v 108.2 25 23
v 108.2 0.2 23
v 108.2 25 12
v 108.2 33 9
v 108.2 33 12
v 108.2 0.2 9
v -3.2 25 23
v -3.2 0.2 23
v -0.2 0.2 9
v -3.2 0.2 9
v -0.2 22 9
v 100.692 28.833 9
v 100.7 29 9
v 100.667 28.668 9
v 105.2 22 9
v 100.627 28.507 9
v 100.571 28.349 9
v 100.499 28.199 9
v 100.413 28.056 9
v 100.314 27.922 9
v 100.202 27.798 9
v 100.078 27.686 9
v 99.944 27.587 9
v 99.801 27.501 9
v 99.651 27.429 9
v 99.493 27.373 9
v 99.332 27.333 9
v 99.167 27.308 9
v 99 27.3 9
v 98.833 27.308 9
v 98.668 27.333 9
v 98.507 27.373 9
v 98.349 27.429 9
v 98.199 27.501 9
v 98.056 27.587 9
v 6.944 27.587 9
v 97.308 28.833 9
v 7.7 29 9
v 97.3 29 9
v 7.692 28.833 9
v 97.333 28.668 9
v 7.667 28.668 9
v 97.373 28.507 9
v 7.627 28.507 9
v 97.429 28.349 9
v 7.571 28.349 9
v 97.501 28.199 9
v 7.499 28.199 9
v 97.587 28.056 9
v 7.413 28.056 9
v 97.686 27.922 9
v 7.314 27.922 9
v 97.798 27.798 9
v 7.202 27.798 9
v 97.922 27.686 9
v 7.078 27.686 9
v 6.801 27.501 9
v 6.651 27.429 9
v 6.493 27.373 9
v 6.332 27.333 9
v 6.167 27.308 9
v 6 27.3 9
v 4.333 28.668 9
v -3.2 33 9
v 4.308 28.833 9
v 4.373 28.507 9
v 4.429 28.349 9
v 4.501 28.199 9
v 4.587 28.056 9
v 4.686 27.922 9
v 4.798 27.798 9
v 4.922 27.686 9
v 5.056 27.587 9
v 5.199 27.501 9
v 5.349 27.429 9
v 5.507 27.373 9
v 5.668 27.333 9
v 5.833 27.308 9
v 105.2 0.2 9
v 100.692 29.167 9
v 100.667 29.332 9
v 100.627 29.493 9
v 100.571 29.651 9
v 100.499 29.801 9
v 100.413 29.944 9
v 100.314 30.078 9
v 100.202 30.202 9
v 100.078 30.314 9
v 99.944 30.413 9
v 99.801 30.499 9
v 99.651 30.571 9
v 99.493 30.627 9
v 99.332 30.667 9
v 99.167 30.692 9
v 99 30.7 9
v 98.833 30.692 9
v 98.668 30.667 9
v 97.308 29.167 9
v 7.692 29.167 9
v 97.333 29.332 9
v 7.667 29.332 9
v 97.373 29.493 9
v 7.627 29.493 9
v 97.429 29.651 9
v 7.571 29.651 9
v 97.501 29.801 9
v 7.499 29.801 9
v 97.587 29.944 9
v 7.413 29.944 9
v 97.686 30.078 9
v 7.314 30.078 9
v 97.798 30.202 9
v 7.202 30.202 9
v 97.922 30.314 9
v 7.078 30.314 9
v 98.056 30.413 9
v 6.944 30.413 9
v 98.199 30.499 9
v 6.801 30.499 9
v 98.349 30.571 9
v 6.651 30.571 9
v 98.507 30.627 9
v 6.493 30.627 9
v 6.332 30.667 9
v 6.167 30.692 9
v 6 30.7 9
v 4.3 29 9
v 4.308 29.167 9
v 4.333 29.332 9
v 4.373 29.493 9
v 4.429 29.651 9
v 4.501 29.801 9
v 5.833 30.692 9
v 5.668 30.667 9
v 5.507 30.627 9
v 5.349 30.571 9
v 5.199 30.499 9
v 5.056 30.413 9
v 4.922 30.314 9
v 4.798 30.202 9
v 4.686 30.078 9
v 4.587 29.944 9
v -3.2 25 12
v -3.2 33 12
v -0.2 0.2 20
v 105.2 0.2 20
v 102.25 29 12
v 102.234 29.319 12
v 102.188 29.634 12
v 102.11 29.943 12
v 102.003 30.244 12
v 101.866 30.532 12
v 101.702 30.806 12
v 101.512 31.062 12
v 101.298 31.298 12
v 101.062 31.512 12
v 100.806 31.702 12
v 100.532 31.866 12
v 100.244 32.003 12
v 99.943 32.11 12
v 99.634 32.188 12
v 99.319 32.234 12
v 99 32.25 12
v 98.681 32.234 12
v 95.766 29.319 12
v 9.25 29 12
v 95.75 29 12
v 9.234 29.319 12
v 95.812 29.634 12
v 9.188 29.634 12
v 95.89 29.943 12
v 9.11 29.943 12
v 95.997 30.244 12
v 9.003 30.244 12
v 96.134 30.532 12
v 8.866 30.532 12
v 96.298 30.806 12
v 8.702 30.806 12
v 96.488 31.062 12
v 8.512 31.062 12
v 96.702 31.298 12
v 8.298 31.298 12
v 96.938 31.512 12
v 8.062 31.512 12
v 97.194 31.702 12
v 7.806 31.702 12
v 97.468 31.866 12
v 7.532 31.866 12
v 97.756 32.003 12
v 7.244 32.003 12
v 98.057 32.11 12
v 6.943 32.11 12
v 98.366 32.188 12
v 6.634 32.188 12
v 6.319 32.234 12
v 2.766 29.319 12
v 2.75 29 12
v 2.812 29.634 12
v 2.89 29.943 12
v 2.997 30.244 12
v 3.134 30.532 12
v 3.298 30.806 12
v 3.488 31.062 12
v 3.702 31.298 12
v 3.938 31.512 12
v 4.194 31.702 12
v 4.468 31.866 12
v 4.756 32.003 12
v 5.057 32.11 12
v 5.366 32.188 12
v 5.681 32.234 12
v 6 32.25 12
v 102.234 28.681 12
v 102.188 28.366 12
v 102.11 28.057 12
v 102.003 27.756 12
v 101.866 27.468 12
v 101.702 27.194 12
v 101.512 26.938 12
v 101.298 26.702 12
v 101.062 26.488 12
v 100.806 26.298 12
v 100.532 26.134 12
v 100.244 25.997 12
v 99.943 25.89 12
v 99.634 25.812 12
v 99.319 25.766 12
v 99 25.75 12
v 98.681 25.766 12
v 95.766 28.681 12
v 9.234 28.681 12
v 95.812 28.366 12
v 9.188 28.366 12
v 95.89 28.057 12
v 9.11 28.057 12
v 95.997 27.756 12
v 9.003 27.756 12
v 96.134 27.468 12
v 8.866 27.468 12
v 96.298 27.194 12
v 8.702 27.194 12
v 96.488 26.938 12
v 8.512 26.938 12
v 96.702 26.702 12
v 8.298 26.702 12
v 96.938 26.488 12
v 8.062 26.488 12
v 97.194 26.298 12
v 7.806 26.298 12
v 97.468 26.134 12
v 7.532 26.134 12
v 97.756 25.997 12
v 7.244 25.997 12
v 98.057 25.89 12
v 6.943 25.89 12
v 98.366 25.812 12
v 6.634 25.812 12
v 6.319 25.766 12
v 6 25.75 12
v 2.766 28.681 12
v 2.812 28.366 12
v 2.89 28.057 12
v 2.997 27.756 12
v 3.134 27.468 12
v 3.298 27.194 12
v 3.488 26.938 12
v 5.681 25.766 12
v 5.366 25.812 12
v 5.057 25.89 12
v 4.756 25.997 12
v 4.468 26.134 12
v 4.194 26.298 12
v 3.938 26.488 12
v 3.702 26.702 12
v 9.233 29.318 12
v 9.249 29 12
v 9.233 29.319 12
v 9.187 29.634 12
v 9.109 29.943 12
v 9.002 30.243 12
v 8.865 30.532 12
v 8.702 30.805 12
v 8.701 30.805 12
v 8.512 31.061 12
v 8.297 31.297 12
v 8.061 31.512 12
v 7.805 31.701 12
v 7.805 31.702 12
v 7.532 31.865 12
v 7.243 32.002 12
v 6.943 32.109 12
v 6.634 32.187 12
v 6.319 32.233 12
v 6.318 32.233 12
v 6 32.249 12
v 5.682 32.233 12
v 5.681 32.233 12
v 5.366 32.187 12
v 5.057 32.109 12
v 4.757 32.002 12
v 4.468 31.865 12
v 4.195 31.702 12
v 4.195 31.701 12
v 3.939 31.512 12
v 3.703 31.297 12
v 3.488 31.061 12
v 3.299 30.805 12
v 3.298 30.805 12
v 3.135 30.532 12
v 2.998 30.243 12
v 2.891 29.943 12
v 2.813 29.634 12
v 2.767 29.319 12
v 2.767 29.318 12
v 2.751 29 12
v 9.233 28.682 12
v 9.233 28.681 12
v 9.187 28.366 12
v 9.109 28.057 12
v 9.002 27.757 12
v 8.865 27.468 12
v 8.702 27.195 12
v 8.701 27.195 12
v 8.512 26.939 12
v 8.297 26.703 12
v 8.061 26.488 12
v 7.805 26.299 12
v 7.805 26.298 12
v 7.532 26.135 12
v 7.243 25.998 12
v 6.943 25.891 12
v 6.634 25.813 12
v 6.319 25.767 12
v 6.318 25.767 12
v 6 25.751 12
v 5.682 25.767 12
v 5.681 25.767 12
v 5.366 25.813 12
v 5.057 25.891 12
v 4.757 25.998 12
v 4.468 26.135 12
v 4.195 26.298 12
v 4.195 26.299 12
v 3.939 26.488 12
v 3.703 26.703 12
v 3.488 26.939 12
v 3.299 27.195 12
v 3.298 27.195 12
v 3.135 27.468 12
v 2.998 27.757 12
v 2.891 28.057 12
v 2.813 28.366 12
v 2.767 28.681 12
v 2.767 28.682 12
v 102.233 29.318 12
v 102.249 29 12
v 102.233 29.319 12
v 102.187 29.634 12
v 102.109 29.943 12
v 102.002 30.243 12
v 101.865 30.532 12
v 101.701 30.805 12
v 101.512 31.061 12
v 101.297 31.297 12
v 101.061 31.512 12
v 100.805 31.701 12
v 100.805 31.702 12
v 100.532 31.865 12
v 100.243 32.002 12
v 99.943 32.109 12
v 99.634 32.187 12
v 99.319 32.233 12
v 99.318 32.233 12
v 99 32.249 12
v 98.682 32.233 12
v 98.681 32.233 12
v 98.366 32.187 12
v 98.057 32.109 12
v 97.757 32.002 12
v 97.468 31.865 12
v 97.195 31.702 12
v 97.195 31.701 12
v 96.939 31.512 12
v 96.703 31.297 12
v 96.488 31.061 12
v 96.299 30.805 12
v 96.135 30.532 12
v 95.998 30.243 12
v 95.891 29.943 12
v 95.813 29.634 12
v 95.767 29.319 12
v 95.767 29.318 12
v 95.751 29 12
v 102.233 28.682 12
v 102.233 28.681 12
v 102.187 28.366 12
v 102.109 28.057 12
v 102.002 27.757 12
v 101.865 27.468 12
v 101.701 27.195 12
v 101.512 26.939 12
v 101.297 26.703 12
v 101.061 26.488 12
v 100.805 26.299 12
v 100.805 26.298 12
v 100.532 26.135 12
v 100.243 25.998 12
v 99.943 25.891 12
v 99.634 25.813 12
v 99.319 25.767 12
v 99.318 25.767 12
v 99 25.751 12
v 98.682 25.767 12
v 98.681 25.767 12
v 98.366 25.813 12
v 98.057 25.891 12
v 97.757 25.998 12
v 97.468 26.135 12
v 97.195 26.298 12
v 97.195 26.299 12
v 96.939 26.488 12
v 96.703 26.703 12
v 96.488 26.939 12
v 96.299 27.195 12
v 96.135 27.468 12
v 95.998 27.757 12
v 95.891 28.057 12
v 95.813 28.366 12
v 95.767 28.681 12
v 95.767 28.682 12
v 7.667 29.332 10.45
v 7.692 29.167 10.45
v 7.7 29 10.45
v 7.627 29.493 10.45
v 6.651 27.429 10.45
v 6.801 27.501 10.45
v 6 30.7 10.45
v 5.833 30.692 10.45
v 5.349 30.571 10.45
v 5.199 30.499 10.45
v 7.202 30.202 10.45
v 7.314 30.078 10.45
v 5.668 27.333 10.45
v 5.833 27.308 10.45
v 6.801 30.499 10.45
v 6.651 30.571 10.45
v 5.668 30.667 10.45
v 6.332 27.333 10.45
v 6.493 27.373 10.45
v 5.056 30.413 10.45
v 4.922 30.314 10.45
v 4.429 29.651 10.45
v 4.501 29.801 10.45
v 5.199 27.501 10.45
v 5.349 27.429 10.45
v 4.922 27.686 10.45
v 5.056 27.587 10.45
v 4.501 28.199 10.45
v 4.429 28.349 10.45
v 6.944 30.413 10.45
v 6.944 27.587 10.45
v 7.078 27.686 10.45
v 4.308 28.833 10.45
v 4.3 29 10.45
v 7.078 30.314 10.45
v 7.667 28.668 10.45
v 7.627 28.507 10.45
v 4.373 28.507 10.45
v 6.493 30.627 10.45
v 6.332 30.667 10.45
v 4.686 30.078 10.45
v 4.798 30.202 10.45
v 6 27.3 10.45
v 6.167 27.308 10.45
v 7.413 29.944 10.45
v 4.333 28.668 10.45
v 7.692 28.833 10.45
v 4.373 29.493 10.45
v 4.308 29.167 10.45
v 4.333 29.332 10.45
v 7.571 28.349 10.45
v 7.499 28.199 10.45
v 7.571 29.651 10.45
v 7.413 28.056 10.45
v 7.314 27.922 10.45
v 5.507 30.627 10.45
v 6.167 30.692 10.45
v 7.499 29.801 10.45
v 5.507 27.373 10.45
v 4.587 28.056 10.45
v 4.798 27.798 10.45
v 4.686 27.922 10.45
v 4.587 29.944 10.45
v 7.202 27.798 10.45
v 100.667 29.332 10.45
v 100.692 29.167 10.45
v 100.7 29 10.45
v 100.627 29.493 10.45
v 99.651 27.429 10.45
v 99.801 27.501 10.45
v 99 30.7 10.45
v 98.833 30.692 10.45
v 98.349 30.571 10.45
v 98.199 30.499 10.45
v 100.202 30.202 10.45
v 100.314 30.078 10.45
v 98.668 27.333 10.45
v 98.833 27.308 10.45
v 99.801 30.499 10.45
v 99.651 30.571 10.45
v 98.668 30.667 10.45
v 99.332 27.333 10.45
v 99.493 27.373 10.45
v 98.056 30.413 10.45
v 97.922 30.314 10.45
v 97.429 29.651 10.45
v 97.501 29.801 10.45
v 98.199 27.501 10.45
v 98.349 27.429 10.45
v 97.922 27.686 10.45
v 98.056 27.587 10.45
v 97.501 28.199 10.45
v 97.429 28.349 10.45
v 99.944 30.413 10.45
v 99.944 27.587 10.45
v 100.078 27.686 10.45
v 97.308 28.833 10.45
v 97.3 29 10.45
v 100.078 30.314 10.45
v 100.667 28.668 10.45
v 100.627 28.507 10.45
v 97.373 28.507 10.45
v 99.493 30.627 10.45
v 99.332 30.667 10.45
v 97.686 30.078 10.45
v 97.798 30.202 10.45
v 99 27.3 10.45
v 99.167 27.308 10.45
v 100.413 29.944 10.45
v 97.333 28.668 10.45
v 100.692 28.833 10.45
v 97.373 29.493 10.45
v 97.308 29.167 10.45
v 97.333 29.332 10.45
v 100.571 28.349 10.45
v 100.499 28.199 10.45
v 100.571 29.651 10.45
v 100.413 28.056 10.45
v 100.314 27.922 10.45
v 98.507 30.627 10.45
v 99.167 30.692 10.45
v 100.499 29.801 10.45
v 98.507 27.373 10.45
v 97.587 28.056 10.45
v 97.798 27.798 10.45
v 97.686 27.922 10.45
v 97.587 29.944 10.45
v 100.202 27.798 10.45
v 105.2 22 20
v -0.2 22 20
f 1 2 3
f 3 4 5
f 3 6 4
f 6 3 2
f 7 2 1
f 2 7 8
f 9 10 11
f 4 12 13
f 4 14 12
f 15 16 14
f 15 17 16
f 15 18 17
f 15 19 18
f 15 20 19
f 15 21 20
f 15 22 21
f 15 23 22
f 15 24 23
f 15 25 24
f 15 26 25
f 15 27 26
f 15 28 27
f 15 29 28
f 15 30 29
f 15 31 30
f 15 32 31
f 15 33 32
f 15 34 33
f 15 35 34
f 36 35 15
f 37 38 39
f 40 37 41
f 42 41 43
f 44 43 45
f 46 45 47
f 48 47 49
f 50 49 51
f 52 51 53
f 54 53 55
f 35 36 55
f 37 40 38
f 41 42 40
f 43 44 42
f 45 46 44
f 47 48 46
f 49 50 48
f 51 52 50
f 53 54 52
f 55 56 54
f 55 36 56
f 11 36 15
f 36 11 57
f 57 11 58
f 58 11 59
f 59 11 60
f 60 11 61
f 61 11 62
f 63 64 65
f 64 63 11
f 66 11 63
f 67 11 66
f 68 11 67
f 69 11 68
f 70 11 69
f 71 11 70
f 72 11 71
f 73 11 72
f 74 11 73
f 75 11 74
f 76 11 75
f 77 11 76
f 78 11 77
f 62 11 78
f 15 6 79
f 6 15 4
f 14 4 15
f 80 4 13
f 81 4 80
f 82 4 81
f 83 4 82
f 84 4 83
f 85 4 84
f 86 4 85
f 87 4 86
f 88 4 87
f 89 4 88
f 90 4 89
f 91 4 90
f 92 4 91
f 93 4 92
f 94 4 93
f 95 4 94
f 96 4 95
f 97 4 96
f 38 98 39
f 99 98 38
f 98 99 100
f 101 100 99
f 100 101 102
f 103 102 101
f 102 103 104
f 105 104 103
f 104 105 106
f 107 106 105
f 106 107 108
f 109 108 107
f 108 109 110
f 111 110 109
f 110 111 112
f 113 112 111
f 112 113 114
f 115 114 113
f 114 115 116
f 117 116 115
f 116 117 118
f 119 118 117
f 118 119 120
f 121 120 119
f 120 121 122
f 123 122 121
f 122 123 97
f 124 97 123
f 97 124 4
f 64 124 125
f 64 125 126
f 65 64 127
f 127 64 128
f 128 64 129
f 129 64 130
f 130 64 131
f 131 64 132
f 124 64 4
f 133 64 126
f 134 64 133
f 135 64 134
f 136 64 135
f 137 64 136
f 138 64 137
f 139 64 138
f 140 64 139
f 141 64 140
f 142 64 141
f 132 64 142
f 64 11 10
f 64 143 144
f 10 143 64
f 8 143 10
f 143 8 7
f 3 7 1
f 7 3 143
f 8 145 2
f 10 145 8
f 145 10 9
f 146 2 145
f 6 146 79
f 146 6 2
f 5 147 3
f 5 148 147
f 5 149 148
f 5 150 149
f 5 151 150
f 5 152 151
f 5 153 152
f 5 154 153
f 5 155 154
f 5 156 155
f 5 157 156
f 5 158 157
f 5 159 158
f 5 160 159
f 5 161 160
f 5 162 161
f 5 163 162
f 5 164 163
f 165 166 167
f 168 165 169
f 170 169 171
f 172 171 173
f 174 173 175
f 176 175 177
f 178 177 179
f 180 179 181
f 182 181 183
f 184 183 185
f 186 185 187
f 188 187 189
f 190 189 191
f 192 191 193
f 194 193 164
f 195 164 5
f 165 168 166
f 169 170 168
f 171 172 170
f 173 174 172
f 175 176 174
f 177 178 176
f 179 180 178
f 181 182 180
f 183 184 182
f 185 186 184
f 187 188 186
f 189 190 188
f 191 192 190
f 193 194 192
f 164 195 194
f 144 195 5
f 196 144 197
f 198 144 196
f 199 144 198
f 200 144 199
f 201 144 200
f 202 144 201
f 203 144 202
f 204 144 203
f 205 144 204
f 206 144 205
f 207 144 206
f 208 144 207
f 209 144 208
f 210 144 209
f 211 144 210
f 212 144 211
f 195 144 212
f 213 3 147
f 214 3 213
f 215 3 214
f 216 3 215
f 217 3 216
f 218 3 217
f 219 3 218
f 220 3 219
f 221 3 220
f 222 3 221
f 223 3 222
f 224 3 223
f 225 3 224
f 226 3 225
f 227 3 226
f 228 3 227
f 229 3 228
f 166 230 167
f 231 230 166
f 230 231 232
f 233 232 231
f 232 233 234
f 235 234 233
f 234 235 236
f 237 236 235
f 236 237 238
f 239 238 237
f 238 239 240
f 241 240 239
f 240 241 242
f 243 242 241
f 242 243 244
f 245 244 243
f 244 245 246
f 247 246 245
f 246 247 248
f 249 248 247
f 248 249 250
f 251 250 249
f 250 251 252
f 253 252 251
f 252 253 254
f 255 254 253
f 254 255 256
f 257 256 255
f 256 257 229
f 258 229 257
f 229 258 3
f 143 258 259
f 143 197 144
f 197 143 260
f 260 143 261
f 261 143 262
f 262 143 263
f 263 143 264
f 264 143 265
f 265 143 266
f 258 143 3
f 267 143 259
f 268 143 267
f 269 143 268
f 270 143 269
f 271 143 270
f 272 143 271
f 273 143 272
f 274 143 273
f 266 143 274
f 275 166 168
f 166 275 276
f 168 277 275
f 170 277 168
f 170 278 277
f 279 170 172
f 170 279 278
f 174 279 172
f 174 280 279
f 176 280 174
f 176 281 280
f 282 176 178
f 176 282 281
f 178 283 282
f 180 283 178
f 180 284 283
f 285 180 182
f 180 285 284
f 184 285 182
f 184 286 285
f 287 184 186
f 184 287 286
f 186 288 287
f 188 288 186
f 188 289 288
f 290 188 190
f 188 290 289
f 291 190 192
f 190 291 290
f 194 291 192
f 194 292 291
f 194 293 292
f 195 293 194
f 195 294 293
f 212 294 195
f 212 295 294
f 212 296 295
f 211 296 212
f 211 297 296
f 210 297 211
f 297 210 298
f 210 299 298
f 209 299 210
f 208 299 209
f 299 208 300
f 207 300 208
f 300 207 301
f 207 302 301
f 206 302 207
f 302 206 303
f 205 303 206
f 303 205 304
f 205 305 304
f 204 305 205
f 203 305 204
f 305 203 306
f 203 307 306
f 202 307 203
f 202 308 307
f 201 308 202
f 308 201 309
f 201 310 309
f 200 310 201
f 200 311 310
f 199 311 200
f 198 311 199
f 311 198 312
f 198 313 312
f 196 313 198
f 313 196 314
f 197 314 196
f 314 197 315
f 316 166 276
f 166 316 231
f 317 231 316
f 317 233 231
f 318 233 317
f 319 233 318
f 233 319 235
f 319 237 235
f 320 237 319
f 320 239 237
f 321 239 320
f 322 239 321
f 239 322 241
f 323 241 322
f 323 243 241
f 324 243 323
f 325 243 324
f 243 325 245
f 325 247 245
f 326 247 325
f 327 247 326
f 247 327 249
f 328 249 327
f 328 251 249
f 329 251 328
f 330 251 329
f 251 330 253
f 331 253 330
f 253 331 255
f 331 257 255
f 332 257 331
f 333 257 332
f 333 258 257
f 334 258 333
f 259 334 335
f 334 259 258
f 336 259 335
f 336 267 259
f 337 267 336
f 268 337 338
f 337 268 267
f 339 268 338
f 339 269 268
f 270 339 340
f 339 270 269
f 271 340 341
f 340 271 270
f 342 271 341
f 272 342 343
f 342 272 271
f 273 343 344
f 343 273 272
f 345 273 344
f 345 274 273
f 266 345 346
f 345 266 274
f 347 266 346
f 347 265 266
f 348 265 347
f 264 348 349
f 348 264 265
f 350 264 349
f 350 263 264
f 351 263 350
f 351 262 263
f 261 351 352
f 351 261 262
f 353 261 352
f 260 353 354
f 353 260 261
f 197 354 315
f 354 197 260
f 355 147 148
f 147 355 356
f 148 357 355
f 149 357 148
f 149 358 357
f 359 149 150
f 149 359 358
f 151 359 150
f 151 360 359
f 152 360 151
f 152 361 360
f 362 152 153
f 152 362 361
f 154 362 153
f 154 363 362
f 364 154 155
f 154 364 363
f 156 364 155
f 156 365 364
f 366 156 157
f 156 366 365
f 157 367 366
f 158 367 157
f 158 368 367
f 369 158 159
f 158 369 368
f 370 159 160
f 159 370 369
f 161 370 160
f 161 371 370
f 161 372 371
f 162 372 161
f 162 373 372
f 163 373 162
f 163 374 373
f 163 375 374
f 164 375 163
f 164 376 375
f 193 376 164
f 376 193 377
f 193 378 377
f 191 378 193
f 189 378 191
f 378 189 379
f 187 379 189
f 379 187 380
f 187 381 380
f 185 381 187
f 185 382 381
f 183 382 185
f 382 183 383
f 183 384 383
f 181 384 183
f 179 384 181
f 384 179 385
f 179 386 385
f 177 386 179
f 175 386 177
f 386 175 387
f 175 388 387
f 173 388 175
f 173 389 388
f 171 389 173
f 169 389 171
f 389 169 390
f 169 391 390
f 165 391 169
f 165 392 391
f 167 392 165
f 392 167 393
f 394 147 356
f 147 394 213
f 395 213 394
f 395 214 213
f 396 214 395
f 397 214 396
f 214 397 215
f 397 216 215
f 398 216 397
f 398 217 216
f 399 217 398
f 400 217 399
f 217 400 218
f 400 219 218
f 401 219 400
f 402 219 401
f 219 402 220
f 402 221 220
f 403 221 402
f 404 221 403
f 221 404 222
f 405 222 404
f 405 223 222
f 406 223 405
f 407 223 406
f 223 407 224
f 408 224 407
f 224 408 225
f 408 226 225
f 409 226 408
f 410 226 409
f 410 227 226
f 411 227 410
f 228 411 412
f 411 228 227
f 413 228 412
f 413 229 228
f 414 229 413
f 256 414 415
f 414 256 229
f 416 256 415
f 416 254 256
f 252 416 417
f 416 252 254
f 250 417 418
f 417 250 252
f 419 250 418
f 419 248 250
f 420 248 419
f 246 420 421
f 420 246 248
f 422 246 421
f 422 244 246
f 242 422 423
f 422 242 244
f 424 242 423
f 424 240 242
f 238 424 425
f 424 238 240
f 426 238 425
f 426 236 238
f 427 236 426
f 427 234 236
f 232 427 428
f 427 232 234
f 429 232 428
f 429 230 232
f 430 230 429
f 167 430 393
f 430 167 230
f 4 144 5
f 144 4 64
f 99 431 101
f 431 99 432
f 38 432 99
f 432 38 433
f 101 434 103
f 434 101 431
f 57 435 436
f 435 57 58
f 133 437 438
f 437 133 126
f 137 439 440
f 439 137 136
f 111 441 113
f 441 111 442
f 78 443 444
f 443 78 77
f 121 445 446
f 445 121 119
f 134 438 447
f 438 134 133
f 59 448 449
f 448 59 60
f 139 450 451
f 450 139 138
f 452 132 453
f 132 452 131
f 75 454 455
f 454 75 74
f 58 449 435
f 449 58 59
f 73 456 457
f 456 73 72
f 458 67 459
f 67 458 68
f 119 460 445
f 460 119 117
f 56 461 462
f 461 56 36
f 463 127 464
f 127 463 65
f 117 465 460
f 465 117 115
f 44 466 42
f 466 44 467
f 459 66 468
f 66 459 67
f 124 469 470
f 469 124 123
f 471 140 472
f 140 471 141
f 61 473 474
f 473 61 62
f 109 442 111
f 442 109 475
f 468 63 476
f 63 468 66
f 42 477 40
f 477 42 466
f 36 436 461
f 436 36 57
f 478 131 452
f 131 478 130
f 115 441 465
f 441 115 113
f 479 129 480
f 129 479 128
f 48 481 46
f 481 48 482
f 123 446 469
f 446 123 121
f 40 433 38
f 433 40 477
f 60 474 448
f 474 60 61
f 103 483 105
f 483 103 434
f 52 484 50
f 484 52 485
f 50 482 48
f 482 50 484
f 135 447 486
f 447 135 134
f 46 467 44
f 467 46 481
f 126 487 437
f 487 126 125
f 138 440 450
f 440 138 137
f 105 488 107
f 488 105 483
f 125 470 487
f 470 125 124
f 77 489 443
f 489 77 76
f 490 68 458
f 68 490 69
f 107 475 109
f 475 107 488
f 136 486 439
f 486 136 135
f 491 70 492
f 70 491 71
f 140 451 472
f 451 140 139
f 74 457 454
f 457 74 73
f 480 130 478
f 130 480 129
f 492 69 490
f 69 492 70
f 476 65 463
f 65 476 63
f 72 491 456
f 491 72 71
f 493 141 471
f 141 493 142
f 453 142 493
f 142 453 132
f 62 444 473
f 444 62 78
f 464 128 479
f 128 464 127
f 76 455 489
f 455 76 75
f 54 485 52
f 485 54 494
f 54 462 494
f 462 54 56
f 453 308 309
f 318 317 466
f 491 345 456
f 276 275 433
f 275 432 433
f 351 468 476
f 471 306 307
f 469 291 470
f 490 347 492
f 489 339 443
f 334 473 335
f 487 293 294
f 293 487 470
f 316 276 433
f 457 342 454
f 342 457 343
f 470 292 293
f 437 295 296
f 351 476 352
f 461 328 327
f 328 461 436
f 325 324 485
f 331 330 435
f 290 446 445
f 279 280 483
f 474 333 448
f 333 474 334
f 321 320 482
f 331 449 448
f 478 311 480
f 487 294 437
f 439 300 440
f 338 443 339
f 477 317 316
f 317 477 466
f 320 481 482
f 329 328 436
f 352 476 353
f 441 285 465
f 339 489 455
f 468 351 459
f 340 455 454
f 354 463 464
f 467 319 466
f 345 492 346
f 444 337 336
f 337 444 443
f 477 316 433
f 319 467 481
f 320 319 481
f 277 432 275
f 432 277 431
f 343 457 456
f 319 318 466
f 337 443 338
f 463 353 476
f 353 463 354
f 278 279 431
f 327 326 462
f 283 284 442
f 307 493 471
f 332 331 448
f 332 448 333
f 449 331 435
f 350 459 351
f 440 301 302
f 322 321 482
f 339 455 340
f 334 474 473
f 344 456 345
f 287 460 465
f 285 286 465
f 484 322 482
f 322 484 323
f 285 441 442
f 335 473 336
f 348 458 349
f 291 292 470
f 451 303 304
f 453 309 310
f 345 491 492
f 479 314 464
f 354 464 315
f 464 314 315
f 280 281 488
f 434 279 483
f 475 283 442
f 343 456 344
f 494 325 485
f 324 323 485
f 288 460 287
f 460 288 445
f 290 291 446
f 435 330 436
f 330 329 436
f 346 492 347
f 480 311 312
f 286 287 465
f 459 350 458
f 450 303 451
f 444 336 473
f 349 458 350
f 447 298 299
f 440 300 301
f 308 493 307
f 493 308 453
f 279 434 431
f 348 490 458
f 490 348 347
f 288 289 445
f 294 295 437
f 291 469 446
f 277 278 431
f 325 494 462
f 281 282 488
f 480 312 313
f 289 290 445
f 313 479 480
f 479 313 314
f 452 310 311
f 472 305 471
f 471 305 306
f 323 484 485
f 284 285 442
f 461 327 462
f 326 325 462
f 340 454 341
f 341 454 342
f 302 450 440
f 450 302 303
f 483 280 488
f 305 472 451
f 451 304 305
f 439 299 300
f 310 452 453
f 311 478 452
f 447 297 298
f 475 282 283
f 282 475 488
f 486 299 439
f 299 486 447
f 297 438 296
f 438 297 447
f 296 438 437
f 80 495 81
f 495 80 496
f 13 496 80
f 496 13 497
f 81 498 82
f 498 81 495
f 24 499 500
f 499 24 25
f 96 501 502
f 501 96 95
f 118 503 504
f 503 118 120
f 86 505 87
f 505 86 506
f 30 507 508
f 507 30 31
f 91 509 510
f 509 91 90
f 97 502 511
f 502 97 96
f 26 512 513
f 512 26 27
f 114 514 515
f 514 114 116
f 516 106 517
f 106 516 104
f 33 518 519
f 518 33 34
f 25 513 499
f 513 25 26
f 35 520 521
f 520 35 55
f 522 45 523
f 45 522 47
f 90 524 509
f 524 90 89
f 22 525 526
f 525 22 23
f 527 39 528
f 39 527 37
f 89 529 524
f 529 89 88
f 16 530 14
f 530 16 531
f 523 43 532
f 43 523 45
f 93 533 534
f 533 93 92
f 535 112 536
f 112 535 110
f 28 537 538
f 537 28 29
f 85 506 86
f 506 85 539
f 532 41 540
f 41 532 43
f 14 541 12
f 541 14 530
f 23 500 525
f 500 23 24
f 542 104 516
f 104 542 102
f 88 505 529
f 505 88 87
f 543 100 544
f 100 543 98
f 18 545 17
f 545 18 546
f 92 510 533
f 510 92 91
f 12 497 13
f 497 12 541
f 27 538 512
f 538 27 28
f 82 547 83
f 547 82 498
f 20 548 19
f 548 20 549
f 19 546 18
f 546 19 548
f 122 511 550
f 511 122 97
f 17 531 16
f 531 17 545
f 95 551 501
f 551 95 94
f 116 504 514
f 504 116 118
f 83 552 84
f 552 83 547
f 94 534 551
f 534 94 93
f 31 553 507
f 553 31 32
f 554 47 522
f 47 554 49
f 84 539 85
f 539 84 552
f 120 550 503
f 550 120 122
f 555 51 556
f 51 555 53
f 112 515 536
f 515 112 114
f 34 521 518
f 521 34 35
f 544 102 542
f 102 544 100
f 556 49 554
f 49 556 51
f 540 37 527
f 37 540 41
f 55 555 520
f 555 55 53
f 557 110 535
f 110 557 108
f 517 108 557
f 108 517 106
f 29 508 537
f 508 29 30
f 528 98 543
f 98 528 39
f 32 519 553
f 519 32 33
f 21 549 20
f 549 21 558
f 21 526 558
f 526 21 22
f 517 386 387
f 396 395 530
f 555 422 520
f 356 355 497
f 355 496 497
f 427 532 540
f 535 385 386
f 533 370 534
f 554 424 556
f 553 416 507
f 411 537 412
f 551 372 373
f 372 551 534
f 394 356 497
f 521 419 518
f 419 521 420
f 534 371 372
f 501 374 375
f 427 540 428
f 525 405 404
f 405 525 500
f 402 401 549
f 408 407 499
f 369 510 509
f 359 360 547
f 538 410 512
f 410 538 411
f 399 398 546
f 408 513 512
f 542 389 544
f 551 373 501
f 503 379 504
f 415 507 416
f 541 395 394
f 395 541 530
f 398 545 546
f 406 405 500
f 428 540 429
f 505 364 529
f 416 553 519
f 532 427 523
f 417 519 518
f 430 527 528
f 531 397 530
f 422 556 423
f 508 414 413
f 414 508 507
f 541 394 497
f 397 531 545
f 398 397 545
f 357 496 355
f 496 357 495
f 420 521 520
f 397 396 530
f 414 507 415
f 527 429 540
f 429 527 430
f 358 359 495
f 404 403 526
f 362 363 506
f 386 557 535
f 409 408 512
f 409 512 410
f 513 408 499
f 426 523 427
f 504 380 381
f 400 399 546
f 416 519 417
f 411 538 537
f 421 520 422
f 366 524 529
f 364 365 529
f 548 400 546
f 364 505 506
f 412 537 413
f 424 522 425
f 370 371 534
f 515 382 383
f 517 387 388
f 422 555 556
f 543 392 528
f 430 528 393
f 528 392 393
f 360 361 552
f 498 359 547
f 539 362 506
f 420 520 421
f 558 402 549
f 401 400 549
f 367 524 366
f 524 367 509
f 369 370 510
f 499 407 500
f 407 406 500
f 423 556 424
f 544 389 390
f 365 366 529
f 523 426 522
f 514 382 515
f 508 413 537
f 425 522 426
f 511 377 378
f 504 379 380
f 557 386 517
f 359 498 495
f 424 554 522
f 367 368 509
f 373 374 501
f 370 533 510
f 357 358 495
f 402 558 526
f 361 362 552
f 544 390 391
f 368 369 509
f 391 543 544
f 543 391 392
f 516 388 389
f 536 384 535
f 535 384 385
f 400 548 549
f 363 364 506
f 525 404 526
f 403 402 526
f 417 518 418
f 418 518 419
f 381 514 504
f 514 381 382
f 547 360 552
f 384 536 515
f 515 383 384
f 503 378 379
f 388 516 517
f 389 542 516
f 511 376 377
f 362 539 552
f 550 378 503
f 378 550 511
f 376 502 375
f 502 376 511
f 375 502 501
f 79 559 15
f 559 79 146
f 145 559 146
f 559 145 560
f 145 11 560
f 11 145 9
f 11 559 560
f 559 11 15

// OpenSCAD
// file: pcbway.scad
// Fabrication rules for PCBWay CNC-milled, anodised 3 mm aluminium plates.
// Values are working assumptions for a quote; confirm against the PCBWay quote/DFM reply.

plate_t        = 3.0;    // stock thickness, aluminium 6061-T6 (or 5052), anodised after machining
min_inner_r    = 1.5;    // smallest inside corner radius of a milled pocket/notch (tool Ø ≤ 3 mm)
min_web        = 2.0;    // minimum material between two features or a feature and an edge
fit_gap        = 0.20;   // clearance per side between two mating aluminium parts
anodise_build  = 0.02;   // anodising adds ~10-25 µm per surface; ignored for these clearances
// Finish (owner, 20 Nov 2026): slightly darker than natural aluminium.
// Order as: bead-blasted, anodised grey / light gunmetal; ask PCBWay for a colour sample first.
finish_note    = "bead blast + grey anodise, slightly darker than natural aluminium";
finish_rgb     = [0.55, 0.56, 0.58];

// Countersunk M3 (ISO 10642 / DIN 7991 head Ø6 mm, 90°)
m3_clear_d     = 3.4;
m3_csk_d       = 6.5;
m3_csk_angle   = 90;

// M2.5 tapped through hole for M/F standoffs (tap drill 2.05 mm; tap after anodising,
// or mask the holes, so the threads stay clean)
m25_tap_d      = 2.05;

$fn = 64;

// 2D rounded rectangle with origin at the lower-left corner
module rrect(w, h, r) {
    if (r <= 0) square([w, h]);
    else translate([r, r]) offset(r = r) square([w - 2 * r, h - 2 * r]);
}

// Countersunk through hole, plate occupying z = 0..t, head on the z = t side
module csk_hole(t = plate_t, d = m3_clear_d, dk = m3_csk_d, angle = m3_csk_angle) {
    depth = (dk - d) / 2 / tan(angle / 2);
    translate([0, 0, -1]) cylinder(d = d, h = t + 2);
    translate([0, 0, t - depth]) cylinder(d1 = d, d2 = dk, h = depth + 0.001);
    translate([0, 0, t]) cylinder(d = dk, h = 1);
}
// main file
// DAW ONE I/O cap — closes the recessed I/O niche from inside so the plugs disappear in the case.
//
// Niche from the owner-supplied case STEP: 105.00 wide, 20.00 high, 22.00 deep, open to the rear
// and to the bottom. Its lower 9 mm is the wooden bottom wall; above that the niche is open to the
// inside of the case. This cap (owner's choice, 20 Nov 2026):
//   - stands on the bottom wall and is screwed down into it from above (inside the case);
//   - forms the niche's ceiling, front wall and two side cheeks above the wood;
//   - carries the connectors in the CEILING, plugs inserted upward from below.
// Milled from one block of aluminium, anodised. Connector cut-outs stay empty until the USB-C
// module and speaker terminals are chosen.
//
// Coordinates: X across the width as seen from the rear, origin at the niche's left edge;
// Y = depth into the case measured from the rear plate's inner face; Z = height above the
// underside of the case.
include <pcbway.scad>

/* [Niche — from the case STEP] */
niche_w      = 105.00;
niche_h      = 20.00;
niche_d      = 22.00;
bottom_wall  = 9.00;

/* [Cap — proposal] */
wall_t       = plate_t;   // ceiling, front wall and cheeks
gap          = fit_gap;   // clearance to the wood and the rear plate
flange_d     = 8.0;       // fastening flange in front of the front wall, on the bottom wall
flange_t     = 3.0;
flange_holes = [6.0, niche_w - 6.0]; // X of the countersunk M3 holes (into inserts in the wood)
cap_inner_r  = min_inner_r;

// Connector cut-outs in the ceiling: [x_centre, y_centre, width_x, depth_y, corner_r]
// measured in niche coordinates. Empty on purpose; fill in once parts are chosen.
ceiling_cutouts = [];

inner_w = niche_w + 2 * gap;              // inner faces flush with (just outside) the wood edges
inner_d = niche_d - gap;                  // front wall inner face at the wood's front face
inner_h = niche_h - bottom_wall;          // 11 mm above the wood
outer_w = inner_w + 2 * wall_t;
outer_d = inner_d + wall_t;

module cap() {
    translate([-gap - wall_t, gap, bottom_wall]) difference() {
        union() {
            // body: cheeks + front wall + ceiling
            cube([outer_w, outer_d, inner_h + wall_t]);
            // fastening flange in front of the front wall
            translate([0, outer_d, 0]) cube([outer_w, flange_d, flange_t]);
        }
        // the niche itself, open at the rear (Y = 0 side) and at the bottom
        translate([wall_t, -1, -1])
            cube([inner_w, inner_d + 1, inner_h + 1]);
        // connector cut-outs through the ceiling
        for (c = ceiling_cutouts)
            translate([wall_t + gap + c[0] - c[2] / 2, c[1] - gap - c[3] / 2, inner_h - 1])
                linear_extrude(wall_t + 2) rrect(c[2], c[3], c[4]);
        // countersunk M3 into the bottom wall, heads up
        for (x = flange_holes)
            translate([wall_t + gap + x, outer_d + flange_d / 2, 0])
                csk_hole(t = flange_t);
    }
}

cap();
